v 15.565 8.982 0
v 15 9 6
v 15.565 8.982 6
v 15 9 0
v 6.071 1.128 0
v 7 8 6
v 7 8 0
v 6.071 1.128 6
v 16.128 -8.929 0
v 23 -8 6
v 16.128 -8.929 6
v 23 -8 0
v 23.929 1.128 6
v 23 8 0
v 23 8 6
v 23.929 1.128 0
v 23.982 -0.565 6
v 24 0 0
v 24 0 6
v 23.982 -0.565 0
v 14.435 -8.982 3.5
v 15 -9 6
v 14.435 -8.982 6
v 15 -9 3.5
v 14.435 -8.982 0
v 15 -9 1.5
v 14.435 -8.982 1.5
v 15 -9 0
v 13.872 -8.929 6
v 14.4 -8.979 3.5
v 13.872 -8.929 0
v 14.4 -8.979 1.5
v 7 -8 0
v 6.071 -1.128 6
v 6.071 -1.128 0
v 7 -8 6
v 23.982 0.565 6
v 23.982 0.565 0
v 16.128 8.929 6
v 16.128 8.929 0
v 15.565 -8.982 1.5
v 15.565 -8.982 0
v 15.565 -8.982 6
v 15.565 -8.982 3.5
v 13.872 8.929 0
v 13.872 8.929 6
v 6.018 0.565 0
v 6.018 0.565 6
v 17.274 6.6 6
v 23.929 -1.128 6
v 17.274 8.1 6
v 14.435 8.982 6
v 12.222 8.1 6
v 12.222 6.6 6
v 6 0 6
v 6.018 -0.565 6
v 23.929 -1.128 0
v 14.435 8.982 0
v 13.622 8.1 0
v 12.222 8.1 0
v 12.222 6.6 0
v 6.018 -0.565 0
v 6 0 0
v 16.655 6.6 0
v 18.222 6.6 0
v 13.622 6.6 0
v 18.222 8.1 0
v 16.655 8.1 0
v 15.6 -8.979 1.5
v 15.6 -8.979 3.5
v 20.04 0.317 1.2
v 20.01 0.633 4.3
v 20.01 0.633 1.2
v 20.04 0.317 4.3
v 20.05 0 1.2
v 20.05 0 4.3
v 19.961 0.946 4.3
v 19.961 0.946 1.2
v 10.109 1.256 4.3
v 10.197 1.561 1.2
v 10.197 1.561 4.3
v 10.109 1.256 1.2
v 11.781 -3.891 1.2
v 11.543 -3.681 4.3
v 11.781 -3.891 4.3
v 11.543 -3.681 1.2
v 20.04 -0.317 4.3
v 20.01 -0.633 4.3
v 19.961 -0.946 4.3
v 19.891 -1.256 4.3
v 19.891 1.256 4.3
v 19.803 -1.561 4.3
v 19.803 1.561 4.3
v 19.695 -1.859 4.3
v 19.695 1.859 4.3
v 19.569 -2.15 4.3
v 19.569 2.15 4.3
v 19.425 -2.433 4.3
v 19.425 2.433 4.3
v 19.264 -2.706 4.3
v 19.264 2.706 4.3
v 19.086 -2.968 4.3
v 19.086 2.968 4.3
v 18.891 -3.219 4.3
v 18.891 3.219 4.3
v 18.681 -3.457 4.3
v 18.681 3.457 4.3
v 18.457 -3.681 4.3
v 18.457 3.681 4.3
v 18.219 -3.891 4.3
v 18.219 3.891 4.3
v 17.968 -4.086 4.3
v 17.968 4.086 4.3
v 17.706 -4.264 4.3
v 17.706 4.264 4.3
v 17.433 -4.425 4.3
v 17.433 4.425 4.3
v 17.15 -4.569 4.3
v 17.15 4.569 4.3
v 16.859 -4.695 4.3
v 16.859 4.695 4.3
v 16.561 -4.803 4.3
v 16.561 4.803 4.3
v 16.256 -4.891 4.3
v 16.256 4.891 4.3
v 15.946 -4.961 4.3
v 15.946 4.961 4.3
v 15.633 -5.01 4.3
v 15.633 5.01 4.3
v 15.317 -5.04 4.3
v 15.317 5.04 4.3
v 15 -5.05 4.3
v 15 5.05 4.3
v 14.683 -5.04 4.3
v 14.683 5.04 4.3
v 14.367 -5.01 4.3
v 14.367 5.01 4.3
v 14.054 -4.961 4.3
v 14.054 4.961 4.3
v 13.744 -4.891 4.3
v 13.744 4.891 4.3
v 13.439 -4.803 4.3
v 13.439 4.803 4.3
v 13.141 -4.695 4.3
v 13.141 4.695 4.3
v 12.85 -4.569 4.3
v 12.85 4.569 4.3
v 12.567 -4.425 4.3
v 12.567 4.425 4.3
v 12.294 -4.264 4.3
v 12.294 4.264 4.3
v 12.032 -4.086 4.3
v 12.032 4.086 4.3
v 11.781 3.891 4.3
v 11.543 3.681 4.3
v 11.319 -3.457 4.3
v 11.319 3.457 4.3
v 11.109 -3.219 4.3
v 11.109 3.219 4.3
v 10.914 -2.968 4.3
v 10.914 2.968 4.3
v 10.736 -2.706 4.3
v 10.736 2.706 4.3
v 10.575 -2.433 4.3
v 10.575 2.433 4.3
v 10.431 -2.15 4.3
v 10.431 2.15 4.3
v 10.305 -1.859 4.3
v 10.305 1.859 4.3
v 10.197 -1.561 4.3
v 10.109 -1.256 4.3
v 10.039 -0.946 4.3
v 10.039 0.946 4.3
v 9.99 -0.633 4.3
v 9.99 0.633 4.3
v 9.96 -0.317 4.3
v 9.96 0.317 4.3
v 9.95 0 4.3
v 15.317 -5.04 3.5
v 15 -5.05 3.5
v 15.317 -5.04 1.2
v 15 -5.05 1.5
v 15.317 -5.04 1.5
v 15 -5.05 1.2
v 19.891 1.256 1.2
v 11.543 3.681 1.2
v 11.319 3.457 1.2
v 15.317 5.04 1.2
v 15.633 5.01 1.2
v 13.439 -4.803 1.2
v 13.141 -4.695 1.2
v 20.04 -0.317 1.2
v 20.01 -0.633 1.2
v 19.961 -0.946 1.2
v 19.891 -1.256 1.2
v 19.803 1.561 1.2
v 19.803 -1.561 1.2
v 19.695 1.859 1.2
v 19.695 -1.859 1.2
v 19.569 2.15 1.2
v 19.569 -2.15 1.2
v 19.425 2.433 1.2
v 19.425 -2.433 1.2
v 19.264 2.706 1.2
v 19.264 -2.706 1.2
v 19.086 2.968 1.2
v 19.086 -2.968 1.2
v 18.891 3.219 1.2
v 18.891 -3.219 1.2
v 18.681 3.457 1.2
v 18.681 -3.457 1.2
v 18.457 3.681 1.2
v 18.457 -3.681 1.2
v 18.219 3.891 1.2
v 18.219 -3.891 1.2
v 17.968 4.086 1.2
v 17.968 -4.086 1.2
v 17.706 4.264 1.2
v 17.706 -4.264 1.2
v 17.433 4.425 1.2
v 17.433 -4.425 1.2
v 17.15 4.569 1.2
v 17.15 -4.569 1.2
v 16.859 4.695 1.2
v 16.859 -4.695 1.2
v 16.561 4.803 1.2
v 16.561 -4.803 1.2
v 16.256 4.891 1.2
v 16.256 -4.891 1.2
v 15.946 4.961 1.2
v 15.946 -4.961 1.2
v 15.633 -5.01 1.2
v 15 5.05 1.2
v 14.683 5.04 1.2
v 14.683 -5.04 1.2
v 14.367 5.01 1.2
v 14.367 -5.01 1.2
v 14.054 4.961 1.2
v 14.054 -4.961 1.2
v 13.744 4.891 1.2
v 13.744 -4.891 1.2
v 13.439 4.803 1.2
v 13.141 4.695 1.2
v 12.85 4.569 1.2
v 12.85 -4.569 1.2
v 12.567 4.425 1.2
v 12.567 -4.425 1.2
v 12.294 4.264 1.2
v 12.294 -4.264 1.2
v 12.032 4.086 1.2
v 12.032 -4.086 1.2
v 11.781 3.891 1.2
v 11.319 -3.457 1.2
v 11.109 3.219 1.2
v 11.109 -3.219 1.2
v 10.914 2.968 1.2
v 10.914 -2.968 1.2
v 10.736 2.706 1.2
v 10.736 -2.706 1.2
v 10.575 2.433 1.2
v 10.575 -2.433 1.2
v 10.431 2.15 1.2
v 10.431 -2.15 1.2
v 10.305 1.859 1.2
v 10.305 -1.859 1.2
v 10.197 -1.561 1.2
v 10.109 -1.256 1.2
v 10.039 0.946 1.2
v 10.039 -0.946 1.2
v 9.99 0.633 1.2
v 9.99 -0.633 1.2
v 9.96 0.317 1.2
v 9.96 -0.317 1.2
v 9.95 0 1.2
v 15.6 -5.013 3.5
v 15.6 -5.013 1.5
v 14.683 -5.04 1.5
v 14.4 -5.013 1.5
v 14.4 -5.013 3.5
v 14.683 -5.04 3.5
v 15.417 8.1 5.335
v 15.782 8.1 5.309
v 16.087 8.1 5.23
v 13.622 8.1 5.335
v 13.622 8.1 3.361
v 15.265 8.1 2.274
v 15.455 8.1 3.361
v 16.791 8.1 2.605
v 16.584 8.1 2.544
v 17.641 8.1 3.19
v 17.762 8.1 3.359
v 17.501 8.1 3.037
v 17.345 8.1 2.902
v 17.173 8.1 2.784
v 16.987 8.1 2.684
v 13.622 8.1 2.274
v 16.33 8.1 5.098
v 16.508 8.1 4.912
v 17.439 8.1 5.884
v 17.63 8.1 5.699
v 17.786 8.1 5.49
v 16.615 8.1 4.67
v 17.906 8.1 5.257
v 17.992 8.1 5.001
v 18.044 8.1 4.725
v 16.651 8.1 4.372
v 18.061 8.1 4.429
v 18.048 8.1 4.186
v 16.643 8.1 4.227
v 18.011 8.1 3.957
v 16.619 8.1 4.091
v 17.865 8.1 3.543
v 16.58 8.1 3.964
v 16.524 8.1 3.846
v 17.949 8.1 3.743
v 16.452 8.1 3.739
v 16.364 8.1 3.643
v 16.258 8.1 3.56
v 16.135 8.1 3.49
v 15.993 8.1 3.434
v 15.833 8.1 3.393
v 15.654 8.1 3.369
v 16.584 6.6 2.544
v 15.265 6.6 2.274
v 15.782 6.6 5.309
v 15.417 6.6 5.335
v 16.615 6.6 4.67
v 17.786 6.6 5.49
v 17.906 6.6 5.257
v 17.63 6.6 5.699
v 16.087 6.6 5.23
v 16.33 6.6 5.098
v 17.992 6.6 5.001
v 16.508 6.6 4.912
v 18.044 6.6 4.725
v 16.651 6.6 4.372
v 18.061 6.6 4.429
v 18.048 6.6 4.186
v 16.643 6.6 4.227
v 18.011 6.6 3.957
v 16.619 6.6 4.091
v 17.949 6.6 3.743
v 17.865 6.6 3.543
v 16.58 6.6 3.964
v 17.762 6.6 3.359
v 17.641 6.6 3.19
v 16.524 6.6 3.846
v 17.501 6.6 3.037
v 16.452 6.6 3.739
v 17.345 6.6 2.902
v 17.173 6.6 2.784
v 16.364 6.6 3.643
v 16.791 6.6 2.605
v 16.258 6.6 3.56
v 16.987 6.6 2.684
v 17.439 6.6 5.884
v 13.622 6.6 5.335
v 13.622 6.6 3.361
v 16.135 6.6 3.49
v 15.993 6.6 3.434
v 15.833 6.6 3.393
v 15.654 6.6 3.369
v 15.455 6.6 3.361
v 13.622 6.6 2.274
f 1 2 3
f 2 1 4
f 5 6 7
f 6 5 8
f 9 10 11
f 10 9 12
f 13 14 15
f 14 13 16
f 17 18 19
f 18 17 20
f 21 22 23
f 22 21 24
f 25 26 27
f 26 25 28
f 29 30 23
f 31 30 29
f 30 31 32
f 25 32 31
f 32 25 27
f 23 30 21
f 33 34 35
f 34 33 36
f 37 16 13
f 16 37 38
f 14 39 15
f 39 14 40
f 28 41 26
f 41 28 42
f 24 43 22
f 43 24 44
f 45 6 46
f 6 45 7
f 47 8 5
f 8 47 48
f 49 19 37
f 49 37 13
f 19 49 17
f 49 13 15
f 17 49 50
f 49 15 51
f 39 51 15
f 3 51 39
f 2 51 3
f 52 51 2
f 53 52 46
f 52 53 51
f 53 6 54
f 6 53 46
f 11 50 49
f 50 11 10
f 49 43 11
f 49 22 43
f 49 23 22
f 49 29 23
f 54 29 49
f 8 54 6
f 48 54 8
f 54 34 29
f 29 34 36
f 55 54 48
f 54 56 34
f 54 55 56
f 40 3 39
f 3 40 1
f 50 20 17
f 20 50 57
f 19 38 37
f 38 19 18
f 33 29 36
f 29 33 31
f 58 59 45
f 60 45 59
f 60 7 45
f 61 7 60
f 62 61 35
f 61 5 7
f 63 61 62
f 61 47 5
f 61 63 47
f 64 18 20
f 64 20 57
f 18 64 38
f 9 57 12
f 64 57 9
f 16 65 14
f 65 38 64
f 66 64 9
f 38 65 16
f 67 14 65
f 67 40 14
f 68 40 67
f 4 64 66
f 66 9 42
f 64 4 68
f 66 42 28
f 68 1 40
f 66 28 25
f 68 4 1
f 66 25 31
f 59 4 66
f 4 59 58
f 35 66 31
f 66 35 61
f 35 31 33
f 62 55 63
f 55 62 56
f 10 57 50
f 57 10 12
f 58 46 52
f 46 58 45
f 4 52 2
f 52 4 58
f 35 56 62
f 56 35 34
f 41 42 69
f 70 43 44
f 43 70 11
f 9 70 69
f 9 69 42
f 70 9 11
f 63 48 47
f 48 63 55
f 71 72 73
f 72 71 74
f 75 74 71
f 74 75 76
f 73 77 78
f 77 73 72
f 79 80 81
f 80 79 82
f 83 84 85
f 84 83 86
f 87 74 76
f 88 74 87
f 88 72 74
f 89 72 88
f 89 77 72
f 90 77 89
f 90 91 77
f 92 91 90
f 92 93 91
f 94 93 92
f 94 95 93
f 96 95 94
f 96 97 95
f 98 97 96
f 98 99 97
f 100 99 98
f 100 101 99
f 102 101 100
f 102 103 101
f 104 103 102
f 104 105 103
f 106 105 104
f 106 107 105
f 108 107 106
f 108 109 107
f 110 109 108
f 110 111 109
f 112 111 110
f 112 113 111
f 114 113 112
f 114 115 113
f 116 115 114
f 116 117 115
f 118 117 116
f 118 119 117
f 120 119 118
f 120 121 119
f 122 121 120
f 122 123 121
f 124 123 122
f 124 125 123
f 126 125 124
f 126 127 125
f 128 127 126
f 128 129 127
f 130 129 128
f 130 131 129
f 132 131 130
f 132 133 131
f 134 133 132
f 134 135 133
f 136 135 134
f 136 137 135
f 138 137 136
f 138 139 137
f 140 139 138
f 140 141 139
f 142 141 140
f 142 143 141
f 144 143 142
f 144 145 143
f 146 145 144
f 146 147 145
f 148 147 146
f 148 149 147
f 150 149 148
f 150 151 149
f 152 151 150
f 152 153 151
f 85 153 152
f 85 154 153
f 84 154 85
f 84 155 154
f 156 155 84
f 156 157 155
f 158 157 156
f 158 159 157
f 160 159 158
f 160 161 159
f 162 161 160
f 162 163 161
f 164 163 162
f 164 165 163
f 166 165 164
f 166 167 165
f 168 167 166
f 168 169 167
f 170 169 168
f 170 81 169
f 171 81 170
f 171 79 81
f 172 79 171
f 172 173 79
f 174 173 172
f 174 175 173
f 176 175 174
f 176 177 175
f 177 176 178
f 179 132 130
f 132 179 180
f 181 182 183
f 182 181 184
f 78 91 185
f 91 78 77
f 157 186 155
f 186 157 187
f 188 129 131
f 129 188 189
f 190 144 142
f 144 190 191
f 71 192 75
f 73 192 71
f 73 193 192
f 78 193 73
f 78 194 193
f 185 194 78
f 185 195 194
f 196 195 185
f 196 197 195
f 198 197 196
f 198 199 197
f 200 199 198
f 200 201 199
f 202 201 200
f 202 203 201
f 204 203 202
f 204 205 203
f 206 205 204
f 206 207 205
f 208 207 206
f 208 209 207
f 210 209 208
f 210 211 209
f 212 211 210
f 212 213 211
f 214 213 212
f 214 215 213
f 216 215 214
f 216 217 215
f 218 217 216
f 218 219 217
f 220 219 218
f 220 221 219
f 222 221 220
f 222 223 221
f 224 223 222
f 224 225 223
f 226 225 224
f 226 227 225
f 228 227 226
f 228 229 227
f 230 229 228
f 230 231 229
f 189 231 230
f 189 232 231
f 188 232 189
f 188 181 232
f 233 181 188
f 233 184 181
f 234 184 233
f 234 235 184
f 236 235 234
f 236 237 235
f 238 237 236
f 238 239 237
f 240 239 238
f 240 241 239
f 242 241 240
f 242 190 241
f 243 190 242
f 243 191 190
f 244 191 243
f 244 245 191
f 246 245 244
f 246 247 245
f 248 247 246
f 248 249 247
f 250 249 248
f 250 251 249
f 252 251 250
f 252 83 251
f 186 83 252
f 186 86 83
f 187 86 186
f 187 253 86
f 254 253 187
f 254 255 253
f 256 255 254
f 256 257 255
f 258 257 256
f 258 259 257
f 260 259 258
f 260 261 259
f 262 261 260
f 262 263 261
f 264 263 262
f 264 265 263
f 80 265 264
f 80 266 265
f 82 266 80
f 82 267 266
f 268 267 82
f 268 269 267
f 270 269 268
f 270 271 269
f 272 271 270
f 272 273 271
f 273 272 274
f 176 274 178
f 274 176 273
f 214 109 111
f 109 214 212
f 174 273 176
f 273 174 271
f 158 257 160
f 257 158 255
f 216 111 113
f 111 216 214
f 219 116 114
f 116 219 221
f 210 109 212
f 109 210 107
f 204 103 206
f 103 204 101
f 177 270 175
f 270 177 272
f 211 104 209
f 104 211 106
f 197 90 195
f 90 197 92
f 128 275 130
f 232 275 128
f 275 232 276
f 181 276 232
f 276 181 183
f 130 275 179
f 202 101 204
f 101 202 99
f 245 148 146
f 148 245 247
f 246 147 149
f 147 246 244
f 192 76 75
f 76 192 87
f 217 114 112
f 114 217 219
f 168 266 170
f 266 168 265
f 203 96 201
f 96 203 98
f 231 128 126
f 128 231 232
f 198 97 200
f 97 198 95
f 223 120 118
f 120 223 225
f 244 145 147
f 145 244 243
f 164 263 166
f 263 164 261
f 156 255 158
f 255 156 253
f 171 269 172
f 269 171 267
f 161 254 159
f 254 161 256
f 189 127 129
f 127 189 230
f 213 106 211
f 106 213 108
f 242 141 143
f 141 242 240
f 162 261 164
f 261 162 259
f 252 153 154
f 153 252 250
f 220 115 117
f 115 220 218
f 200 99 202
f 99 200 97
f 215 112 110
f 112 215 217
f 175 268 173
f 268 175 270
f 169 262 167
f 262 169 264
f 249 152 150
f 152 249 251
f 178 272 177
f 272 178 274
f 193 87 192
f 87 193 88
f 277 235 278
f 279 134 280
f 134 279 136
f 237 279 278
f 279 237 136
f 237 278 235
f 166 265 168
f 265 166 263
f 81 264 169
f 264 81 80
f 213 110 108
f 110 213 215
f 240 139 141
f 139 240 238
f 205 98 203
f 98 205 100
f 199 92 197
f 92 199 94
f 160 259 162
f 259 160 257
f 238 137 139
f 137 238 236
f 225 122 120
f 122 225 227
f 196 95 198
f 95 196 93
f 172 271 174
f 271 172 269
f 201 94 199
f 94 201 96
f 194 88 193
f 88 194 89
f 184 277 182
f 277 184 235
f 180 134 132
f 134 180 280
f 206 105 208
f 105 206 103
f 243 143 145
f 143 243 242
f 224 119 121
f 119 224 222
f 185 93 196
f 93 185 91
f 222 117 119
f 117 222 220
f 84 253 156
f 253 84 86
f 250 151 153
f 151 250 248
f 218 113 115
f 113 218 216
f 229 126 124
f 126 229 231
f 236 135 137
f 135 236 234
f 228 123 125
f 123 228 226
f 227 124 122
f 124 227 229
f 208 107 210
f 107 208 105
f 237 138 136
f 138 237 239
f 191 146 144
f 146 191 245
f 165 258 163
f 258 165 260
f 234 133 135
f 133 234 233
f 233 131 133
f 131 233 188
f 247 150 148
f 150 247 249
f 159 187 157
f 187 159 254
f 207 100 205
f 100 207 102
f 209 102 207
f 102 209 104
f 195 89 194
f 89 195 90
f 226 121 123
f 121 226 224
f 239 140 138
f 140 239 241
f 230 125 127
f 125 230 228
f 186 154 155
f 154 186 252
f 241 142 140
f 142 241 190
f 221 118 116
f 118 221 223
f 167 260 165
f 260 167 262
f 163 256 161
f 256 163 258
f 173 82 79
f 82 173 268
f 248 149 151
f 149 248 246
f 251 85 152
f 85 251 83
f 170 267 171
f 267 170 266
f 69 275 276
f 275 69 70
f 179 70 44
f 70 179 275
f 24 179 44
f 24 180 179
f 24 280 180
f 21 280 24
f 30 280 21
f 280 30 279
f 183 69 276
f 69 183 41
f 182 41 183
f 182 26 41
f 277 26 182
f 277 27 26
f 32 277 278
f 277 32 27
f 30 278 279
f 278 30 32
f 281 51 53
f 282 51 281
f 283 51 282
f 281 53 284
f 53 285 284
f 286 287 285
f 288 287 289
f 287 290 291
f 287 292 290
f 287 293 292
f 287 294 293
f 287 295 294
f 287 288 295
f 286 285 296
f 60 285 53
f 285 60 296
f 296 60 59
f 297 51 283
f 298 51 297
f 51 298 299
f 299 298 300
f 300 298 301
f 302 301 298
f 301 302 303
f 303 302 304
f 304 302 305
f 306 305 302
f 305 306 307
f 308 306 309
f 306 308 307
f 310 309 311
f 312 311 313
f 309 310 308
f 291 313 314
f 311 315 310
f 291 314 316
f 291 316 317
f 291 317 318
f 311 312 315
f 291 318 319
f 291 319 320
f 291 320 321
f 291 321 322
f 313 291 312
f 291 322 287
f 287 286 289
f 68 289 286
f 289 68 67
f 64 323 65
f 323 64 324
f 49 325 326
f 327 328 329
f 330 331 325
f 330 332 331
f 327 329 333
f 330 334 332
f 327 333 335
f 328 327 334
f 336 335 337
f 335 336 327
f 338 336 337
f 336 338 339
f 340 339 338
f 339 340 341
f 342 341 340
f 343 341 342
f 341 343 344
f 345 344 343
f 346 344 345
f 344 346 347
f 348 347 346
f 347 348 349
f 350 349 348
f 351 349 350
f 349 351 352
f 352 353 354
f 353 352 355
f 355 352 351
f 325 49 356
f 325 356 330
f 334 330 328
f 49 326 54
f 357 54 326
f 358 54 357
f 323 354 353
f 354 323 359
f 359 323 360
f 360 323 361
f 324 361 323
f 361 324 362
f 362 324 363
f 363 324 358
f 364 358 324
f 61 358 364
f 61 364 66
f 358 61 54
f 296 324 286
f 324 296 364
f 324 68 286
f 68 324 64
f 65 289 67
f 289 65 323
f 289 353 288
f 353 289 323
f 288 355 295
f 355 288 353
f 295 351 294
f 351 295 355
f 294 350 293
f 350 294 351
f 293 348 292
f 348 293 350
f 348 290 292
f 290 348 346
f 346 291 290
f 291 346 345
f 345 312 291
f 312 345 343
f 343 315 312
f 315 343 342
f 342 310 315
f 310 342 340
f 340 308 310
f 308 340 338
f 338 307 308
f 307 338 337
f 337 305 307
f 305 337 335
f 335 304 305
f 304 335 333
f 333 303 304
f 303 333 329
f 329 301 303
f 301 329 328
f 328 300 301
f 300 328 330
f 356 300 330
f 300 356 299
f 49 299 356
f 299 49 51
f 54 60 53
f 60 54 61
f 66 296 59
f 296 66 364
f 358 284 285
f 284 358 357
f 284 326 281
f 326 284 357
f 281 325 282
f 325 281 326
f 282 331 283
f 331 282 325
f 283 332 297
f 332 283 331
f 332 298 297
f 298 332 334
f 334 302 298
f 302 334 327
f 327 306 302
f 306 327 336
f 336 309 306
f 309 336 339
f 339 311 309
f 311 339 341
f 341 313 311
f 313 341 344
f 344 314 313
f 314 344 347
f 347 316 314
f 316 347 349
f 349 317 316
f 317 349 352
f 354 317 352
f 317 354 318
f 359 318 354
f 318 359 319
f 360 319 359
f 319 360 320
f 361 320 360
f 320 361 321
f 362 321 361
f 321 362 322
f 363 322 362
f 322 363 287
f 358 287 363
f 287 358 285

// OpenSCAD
// V51 Pacer Saddle - Optimized for Vybronics VG1030001XH
// Specs: 10mm Dia, 3mm Thick, AWG 30 Leads

module v51_saddle(side_label) {
    difference() {
        // Main Body: Curved to sit against headphone battery pods
        hull() {
            translate([-8, -8, 0]) cube([16, 16, 6]);
            translate([0, 0, 0]) cylinder(d=18, h=6, $fn=100);
        }

        // Motor Cavity (Skin-side)
        // 10.1mm gives a snug press-fit for the 10mm LRA [cite: 154]
        translate([0, 0, 1.2]) 
            cylinder(d=10.1, h=3.1, $fn=100);

        // Wire Exit Trench
        // 1.2mm width is perfect for the AWG 30 UL3302 wires [cite: 161]
        translate([0, -8, 2.5]) 
            cube([1.2, 12, 2], center=true);

        // Embossed Channel Identifier
        // Subtracts "L" or "R" 1mm deep into the side wall
        translate([0, 8.1, 3]) 
            rotate([90, 0, 0]) 
                linear_extrude(height = 1.5) 
                    text(side_label, size=7, font="Arial:style=Bold", halign="center", valign="center");
    }
}

// RENDER COMMANDS
// To export, uncomment one side at a time
//translate([-15, 0, 0]) v51_saddle("L"); 
translate([15, 0, 0]) v51_saddle("R");
